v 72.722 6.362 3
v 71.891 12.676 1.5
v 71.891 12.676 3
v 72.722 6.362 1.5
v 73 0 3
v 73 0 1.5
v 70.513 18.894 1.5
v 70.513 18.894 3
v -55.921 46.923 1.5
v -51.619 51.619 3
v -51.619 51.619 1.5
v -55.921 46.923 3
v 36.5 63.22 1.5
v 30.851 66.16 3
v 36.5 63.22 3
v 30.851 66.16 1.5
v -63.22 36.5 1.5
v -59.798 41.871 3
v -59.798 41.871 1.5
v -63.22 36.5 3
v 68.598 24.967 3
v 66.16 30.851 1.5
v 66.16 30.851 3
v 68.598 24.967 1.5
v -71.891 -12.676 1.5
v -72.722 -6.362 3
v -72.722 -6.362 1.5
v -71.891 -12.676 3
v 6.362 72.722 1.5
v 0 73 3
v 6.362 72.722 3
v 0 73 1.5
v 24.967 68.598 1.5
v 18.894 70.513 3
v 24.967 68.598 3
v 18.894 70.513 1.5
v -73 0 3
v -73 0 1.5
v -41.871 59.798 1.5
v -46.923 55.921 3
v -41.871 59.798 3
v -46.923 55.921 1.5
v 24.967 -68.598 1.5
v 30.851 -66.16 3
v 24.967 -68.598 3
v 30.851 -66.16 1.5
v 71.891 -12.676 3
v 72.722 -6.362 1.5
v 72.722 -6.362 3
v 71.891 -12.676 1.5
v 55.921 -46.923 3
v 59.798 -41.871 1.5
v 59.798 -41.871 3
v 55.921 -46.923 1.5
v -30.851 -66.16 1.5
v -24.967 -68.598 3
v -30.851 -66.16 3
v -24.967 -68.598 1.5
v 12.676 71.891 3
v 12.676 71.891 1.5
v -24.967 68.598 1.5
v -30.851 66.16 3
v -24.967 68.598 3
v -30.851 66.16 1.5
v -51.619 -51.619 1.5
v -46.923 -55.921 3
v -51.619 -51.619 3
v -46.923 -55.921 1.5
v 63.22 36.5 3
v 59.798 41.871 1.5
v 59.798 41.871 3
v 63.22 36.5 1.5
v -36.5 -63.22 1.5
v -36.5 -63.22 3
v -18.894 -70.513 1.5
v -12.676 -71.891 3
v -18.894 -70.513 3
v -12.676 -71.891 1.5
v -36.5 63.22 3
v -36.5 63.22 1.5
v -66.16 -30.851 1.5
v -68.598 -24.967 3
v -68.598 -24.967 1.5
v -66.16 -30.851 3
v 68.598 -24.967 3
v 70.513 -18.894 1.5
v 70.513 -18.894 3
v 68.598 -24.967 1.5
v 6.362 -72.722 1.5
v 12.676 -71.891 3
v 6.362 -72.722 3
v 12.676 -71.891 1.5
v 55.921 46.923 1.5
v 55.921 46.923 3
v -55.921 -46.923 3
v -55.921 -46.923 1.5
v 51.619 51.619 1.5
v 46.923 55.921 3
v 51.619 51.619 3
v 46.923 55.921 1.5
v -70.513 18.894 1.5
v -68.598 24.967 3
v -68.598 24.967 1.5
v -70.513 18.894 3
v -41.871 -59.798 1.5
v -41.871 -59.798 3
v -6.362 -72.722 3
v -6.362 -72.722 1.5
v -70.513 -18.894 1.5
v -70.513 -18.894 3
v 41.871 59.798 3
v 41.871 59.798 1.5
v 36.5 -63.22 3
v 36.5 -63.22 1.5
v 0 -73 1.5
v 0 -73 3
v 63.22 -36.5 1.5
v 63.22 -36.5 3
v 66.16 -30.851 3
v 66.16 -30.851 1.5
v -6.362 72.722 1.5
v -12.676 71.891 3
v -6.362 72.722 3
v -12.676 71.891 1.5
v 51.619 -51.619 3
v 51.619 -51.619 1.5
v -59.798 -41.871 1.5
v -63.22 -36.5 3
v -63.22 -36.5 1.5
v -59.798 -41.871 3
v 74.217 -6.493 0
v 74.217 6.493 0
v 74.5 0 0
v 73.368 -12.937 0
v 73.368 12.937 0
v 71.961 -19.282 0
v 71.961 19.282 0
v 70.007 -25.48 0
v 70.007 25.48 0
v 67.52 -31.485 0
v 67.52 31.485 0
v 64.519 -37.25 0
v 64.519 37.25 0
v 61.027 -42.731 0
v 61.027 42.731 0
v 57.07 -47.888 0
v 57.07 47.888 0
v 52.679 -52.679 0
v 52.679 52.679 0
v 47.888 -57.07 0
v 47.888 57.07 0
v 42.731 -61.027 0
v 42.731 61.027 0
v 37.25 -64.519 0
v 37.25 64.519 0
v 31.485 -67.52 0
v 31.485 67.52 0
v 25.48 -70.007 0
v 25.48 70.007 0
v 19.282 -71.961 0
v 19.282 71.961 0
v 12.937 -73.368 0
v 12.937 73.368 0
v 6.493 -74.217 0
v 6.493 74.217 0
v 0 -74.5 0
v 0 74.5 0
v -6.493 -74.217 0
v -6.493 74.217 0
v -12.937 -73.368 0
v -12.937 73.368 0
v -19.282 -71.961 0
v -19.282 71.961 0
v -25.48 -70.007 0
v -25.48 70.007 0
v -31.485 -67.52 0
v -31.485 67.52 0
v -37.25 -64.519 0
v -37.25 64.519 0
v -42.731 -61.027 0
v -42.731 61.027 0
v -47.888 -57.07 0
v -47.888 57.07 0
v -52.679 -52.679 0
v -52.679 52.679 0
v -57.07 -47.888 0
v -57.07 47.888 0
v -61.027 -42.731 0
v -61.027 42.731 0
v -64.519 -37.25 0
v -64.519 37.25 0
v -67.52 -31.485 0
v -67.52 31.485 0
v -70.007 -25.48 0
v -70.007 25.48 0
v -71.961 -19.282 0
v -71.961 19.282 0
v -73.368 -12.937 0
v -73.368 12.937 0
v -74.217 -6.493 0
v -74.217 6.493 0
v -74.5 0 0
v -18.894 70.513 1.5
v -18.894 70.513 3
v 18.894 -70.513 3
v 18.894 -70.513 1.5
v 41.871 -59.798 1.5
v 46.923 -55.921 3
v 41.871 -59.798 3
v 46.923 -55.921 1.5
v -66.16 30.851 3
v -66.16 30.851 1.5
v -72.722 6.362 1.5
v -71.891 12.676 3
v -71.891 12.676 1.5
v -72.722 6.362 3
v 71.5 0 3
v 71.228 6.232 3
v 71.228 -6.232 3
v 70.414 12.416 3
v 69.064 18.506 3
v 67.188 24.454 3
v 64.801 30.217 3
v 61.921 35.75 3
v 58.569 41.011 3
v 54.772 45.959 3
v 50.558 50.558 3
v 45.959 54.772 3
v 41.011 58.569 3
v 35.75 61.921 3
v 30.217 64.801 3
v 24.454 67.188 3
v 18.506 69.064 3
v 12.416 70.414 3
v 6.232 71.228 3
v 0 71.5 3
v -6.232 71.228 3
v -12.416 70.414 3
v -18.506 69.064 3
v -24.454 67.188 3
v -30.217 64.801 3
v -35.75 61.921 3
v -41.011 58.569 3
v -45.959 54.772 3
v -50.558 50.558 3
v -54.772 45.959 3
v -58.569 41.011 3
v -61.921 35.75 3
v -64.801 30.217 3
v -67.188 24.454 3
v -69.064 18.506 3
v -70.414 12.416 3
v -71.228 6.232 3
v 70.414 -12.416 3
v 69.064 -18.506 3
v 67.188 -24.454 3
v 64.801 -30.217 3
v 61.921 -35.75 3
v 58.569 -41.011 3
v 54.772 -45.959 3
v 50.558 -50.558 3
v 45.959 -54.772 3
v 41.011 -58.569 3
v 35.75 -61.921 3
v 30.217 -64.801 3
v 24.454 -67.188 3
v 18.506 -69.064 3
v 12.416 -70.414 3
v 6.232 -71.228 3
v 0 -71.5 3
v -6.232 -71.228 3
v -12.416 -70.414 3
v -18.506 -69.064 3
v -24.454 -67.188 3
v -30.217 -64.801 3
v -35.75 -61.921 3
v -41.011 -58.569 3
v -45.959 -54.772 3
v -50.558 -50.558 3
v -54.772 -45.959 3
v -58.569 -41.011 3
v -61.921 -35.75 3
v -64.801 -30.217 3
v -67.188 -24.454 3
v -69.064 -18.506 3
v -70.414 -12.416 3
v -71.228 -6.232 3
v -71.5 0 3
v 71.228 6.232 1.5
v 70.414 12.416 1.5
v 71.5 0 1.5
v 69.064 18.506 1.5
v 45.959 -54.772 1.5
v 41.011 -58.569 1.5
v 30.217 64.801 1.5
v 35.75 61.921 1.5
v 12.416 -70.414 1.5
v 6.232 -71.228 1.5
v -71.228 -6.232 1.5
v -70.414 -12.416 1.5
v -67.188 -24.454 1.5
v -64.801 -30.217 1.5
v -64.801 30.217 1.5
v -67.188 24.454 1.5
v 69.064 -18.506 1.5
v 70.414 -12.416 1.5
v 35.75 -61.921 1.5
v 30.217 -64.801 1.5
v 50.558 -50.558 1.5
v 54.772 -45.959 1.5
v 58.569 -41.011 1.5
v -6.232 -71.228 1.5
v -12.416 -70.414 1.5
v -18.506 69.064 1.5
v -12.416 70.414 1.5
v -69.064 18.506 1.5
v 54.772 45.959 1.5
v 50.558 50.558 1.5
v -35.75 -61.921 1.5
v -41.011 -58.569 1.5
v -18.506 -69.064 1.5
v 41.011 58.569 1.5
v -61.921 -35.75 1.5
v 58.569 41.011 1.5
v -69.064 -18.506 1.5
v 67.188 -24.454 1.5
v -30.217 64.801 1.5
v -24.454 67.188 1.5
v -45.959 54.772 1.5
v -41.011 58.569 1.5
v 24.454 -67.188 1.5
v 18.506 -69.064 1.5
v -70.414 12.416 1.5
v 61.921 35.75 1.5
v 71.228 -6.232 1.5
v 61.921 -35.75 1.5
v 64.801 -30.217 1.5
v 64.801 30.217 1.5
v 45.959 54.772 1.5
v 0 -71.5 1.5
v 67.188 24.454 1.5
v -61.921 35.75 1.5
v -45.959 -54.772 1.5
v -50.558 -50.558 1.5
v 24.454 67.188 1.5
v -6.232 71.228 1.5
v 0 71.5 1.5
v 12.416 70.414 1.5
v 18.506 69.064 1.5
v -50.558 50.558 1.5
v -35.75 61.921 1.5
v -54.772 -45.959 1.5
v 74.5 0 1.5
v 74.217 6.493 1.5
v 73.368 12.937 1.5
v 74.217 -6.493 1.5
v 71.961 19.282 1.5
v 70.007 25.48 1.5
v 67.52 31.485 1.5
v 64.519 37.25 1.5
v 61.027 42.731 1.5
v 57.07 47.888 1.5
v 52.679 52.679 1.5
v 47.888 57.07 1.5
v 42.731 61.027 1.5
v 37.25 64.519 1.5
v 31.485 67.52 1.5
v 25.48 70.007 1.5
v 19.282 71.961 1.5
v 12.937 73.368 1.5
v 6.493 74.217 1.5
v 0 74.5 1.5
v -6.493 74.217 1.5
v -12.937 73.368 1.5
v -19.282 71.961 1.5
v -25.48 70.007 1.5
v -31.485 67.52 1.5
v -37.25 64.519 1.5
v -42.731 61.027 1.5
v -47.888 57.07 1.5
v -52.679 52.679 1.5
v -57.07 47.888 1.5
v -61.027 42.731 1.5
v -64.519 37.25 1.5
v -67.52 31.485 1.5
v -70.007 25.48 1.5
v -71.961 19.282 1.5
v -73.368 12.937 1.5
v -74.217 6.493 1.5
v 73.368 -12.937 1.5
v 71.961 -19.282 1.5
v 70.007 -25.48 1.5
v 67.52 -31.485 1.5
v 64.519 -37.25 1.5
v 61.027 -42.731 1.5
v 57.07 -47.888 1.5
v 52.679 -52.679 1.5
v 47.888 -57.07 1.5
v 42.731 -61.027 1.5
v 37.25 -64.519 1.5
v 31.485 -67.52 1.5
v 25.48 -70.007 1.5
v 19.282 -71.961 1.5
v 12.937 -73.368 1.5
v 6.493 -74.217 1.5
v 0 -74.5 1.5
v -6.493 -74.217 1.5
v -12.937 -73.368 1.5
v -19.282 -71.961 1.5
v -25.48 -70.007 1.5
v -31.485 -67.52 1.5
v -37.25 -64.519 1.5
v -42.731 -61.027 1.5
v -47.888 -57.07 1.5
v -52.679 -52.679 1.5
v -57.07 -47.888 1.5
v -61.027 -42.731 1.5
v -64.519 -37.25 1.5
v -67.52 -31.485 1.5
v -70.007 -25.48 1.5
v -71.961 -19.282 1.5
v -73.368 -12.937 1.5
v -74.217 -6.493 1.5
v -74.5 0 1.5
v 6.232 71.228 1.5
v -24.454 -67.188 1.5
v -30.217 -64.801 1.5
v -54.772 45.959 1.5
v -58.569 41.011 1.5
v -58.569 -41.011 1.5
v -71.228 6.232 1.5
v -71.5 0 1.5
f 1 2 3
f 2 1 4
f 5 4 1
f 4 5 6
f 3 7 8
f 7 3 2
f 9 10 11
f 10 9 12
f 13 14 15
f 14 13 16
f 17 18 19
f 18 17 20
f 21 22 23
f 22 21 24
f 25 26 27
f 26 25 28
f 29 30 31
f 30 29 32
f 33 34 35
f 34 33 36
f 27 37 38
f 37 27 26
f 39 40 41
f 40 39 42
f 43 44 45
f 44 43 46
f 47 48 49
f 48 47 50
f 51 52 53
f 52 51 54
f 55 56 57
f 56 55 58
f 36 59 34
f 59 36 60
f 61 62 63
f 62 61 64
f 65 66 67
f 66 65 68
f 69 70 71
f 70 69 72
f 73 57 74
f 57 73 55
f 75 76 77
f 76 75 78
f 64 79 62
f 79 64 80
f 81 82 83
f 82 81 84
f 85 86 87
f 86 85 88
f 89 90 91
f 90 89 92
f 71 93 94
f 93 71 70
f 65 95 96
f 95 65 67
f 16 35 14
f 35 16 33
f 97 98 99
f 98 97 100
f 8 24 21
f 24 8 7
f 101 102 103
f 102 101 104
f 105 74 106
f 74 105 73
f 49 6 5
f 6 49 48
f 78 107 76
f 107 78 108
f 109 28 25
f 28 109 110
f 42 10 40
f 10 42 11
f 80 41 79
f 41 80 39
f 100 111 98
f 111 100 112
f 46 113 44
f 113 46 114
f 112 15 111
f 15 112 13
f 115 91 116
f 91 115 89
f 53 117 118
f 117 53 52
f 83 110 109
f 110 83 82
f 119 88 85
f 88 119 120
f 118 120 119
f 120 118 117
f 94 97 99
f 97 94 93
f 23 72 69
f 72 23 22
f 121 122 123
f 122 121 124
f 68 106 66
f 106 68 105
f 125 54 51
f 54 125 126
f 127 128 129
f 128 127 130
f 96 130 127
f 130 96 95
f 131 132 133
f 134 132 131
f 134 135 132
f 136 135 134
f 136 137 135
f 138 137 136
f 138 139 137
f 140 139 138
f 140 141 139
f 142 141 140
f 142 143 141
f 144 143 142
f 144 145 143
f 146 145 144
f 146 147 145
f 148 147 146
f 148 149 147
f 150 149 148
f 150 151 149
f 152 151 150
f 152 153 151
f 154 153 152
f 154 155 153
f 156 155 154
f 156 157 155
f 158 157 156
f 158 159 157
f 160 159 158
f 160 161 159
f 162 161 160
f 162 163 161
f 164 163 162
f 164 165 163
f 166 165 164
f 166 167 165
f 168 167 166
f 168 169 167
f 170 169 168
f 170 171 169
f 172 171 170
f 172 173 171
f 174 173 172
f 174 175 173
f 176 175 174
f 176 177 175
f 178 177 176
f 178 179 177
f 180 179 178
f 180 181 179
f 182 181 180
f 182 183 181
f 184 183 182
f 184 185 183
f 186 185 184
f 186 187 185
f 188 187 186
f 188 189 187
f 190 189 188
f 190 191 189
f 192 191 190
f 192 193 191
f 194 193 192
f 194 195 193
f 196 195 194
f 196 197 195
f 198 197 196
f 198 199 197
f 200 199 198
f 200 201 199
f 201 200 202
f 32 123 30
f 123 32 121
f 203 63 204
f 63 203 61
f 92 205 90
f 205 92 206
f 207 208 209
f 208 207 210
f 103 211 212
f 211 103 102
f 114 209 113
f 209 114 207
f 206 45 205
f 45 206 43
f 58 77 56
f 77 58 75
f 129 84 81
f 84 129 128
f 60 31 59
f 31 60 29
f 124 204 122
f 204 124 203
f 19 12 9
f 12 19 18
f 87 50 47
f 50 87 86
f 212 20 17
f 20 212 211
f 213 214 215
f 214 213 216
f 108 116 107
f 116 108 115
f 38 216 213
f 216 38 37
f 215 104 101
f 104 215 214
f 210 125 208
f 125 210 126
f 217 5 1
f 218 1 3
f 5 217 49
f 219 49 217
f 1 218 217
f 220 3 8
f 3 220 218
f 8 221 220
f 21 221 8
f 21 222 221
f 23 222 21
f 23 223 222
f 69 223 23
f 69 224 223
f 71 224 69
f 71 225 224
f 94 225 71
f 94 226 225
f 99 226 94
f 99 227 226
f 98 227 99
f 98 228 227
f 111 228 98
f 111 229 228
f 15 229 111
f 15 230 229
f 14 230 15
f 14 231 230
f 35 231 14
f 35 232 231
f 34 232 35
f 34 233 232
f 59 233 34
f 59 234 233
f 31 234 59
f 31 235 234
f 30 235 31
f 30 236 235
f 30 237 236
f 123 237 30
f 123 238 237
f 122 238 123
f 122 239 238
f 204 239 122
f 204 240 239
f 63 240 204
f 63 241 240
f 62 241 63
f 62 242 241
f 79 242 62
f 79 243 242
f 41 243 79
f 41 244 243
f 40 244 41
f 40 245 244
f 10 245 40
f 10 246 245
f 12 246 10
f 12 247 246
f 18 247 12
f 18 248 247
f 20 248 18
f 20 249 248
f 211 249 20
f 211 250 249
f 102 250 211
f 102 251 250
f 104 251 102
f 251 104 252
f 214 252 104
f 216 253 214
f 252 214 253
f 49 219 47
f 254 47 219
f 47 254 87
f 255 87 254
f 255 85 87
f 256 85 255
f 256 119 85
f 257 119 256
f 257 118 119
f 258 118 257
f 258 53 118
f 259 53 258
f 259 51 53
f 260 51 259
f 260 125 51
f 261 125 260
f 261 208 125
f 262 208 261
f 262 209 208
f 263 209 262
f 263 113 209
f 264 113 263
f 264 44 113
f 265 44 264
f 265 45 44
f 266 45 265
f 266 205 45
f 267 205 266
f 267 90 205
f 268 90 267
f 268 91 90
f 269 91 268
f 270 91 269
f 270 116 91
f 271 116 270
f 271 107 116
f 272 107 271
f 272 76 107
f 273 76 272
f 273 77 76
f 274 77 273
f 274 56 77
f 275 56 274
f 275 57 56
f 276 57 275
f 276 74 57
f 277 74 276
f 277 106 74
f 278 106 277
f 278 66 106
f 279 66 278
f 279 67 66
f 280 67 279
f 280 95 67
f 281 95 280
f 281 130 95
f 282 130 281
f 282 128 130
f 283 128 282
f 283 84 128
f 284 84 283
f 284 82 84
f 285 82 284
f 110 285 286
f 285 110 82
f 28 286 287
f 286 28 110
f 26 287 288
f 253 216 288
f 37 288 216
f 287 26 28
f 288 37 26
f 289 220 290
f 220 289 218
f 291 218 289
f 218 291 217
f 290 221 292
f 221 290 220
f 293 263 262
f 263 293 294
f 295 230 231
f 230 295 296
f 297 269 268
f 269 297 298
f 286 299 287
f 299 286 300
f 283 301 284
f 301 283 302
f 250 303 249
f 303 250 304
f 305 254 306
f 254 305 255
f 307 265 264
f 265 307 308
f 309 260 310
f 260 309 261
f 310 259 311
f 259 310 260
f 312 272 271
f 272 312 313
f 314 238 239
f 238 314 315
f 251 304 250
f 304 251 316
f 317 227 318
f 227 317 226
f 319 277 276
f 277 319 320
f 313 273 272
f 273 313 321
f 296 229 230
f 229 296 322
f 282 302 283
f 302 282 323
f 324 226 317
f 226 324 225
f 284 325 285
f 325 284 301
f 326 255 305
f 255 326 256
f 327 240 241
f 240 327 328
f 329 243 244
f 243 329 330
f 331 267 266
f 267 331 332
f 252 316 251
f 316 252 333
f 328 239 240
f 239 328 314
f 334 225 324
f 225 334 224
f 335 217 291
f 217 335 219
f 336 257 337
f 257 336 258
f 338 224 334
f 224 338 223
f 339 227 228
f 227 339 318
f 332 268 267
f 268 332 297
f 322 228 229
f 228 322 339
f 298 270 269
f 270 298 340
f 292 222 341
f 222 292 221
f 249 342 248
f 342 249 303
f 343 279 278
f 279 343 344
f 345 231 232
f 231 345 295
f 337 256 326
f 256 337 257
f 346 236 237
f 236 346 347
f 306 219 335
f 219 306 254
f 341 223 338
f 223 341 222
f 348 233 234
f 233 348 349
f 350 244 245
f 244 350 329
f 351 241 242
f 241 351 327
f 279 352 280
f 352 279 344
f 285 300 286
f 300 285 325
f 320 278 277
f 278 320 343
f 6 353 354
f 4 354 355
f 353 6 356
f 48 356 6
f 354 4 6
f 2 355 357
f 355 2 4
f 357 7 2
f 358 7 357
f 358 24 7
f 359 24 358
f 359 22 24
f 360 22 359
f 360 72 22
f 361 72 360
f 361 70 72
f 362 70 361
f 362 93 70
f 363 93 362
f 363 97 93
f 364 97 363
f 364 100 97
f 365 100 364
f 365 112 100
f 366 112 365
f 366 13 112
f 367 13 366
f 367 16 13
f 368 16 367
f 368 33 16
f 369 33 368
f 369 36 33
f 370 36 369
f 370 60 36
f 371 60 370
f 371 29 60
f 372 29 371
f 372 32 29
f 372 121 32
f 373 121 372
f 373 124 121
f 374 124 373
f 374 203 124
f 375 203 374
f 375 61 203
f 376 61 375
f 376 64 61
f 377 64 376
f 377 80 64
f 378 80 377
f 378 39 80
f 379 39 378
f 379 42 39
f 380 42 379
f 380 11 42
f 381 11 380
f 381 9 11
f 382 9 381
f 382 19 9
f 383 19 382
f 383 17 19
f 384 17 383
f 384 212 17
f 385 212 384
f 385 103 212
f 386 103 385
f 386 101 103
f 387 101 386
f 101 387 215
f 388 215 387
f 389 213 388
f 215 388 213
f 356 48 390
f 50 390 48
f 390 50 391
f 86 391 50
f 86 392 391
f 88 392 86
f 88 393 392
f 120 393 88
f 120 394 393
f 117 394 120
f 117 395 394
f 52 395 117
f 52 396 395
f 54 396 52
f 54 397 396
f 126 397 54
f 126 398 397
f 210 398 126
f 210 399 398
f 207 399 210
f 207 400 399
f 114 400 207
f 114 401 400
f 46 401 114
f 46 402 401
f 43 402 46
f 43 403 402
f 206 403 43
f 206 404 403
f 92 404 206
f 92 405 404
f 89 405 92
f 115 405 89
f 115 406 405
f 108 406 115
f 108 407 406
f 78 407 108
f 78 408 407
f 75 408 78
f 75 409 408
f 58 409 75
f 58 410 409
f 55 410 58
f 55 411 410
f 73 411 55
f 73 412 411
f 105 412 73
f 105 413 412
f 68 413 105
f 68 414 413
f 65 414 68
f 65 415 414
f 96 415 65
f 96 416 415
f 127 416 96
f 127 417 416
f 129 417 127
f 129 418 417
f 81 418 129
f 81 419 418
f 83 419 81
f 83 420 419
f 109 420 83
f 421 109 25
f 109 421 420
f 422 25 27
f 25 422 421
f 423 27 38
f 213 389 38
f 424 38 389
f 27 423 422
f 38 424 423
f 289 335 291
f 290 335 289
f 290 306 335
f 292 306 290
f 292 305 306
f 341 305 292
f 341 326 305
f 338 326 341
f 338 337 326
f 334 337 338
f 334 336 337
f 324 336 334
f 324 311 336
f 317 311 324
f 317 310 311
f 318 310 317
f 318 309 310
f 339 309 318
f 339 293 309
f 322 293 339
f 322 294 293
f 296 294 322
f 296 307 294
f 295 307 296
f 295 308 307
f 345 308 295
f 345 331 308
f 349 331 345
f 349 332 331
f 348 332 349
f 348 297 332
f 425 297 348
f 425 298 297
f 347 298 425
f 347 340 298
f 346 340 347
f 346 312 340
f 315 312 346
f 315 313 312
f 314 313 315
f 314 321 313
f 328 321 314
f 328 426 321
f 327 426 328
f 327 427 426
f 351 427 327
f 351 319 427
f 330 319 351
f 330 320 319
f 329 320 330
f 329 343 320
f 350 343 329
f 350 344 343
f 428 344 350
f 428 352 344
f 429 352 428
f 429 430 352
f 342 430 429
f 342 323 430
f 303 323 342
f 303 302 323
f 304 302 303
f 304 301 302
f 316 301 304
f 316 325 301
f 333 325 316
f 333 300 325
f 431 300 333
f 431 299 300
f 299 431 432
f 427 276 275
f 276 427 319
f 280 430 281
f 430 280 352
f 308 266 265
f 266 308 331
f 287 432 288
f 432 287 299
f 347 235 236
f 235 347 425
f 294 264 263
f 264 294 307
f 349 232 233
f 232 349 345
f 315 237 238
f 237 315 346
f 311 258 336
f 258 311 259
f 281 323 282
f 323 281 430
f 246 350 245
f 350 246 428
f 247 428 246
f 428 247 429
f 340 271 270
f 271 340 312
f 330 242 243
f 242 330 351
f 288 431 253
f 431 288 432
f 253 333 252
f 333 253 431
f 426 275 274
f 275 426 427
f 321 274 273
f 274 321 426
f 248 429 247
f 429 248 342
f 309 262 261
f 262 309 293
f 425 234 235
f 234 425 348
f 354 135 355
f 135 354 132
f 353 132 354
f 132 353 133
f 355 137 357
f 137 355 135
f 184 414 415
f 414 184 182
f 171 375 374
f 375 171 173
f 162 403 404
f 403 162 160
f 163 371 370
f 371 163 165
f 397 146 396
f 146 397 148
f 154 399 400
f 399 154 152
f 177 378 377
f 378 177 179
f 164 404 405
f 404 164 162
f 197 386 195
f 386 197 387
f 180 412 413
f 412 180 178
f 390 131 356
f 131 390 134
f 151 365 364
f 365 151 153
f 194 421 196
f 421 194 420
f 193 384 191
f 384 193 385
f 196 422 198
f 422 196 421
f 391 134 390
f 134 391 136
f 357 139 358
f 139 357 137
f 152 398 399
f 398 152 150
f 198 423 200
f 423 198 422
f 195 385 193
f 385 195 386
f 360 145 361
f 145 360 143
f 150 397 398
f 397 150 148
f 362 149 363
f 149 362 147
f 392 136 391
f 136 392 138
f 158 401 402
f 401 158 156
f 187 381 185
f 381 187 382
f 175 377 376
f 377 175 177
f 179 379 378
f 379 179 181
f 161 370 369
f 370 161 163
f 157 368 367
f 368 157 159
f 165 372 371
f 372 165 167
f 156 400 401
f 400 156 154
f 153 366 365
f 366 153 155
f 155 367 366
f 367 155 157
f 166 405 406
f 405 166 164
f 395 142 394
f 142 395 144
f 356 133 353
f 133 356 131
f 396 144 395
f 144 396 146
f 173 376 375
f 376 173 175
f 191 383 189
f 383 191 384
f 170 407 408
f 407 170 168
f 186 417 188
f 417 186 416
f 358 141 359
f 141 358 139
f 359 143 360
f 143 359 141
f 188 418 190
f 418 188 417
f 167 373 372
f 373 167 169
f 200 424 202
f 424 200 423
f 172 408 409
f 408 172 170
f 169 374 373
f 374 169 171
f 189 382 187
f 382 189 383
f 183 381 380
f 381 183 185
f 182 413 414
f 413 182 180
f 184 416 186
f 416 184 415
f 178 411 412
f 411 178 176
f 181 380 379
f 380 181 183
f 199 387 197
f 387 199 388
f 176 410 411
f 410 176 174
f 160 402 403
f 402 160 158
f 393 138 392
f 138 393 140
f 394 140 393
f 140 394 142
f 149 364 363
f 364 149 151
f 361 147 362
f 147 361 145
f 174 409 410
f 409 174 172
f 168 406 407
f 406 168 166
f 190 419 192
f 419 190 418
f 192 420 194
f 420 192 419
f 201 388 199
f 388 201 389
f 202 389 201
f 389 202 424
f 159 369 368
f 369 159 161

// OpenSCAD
inner_radius = 70;
wall_thickness = 1.5;
outer_radius = inner_radius + wall_thickness;
inner_height = 120;
outer_height = inner_height + wall_thickness;
$fa = 5;
$fs = 0.2;

module cylindrical_box(r=10, h=6, thickness=1) {
    difference() {
        cylinder(r=r, h=h);
        translate([0,0,wall_thickness]) cylinder(r=r-thickness, h=h-thickness);
    }
}

module base() {
    base_radius = outer_radius+2*wall_thickness;

    cylinder(r=base_radius, h=wall_thickness);
    cylindrical_box(r=outer_radius+wall_thickness, h=wall_thickness*2, thickness=wall_thickness);
}

//cylindrical_box(r=outer_radius, h=outer_height, thickness=wall_thickness);

base();
